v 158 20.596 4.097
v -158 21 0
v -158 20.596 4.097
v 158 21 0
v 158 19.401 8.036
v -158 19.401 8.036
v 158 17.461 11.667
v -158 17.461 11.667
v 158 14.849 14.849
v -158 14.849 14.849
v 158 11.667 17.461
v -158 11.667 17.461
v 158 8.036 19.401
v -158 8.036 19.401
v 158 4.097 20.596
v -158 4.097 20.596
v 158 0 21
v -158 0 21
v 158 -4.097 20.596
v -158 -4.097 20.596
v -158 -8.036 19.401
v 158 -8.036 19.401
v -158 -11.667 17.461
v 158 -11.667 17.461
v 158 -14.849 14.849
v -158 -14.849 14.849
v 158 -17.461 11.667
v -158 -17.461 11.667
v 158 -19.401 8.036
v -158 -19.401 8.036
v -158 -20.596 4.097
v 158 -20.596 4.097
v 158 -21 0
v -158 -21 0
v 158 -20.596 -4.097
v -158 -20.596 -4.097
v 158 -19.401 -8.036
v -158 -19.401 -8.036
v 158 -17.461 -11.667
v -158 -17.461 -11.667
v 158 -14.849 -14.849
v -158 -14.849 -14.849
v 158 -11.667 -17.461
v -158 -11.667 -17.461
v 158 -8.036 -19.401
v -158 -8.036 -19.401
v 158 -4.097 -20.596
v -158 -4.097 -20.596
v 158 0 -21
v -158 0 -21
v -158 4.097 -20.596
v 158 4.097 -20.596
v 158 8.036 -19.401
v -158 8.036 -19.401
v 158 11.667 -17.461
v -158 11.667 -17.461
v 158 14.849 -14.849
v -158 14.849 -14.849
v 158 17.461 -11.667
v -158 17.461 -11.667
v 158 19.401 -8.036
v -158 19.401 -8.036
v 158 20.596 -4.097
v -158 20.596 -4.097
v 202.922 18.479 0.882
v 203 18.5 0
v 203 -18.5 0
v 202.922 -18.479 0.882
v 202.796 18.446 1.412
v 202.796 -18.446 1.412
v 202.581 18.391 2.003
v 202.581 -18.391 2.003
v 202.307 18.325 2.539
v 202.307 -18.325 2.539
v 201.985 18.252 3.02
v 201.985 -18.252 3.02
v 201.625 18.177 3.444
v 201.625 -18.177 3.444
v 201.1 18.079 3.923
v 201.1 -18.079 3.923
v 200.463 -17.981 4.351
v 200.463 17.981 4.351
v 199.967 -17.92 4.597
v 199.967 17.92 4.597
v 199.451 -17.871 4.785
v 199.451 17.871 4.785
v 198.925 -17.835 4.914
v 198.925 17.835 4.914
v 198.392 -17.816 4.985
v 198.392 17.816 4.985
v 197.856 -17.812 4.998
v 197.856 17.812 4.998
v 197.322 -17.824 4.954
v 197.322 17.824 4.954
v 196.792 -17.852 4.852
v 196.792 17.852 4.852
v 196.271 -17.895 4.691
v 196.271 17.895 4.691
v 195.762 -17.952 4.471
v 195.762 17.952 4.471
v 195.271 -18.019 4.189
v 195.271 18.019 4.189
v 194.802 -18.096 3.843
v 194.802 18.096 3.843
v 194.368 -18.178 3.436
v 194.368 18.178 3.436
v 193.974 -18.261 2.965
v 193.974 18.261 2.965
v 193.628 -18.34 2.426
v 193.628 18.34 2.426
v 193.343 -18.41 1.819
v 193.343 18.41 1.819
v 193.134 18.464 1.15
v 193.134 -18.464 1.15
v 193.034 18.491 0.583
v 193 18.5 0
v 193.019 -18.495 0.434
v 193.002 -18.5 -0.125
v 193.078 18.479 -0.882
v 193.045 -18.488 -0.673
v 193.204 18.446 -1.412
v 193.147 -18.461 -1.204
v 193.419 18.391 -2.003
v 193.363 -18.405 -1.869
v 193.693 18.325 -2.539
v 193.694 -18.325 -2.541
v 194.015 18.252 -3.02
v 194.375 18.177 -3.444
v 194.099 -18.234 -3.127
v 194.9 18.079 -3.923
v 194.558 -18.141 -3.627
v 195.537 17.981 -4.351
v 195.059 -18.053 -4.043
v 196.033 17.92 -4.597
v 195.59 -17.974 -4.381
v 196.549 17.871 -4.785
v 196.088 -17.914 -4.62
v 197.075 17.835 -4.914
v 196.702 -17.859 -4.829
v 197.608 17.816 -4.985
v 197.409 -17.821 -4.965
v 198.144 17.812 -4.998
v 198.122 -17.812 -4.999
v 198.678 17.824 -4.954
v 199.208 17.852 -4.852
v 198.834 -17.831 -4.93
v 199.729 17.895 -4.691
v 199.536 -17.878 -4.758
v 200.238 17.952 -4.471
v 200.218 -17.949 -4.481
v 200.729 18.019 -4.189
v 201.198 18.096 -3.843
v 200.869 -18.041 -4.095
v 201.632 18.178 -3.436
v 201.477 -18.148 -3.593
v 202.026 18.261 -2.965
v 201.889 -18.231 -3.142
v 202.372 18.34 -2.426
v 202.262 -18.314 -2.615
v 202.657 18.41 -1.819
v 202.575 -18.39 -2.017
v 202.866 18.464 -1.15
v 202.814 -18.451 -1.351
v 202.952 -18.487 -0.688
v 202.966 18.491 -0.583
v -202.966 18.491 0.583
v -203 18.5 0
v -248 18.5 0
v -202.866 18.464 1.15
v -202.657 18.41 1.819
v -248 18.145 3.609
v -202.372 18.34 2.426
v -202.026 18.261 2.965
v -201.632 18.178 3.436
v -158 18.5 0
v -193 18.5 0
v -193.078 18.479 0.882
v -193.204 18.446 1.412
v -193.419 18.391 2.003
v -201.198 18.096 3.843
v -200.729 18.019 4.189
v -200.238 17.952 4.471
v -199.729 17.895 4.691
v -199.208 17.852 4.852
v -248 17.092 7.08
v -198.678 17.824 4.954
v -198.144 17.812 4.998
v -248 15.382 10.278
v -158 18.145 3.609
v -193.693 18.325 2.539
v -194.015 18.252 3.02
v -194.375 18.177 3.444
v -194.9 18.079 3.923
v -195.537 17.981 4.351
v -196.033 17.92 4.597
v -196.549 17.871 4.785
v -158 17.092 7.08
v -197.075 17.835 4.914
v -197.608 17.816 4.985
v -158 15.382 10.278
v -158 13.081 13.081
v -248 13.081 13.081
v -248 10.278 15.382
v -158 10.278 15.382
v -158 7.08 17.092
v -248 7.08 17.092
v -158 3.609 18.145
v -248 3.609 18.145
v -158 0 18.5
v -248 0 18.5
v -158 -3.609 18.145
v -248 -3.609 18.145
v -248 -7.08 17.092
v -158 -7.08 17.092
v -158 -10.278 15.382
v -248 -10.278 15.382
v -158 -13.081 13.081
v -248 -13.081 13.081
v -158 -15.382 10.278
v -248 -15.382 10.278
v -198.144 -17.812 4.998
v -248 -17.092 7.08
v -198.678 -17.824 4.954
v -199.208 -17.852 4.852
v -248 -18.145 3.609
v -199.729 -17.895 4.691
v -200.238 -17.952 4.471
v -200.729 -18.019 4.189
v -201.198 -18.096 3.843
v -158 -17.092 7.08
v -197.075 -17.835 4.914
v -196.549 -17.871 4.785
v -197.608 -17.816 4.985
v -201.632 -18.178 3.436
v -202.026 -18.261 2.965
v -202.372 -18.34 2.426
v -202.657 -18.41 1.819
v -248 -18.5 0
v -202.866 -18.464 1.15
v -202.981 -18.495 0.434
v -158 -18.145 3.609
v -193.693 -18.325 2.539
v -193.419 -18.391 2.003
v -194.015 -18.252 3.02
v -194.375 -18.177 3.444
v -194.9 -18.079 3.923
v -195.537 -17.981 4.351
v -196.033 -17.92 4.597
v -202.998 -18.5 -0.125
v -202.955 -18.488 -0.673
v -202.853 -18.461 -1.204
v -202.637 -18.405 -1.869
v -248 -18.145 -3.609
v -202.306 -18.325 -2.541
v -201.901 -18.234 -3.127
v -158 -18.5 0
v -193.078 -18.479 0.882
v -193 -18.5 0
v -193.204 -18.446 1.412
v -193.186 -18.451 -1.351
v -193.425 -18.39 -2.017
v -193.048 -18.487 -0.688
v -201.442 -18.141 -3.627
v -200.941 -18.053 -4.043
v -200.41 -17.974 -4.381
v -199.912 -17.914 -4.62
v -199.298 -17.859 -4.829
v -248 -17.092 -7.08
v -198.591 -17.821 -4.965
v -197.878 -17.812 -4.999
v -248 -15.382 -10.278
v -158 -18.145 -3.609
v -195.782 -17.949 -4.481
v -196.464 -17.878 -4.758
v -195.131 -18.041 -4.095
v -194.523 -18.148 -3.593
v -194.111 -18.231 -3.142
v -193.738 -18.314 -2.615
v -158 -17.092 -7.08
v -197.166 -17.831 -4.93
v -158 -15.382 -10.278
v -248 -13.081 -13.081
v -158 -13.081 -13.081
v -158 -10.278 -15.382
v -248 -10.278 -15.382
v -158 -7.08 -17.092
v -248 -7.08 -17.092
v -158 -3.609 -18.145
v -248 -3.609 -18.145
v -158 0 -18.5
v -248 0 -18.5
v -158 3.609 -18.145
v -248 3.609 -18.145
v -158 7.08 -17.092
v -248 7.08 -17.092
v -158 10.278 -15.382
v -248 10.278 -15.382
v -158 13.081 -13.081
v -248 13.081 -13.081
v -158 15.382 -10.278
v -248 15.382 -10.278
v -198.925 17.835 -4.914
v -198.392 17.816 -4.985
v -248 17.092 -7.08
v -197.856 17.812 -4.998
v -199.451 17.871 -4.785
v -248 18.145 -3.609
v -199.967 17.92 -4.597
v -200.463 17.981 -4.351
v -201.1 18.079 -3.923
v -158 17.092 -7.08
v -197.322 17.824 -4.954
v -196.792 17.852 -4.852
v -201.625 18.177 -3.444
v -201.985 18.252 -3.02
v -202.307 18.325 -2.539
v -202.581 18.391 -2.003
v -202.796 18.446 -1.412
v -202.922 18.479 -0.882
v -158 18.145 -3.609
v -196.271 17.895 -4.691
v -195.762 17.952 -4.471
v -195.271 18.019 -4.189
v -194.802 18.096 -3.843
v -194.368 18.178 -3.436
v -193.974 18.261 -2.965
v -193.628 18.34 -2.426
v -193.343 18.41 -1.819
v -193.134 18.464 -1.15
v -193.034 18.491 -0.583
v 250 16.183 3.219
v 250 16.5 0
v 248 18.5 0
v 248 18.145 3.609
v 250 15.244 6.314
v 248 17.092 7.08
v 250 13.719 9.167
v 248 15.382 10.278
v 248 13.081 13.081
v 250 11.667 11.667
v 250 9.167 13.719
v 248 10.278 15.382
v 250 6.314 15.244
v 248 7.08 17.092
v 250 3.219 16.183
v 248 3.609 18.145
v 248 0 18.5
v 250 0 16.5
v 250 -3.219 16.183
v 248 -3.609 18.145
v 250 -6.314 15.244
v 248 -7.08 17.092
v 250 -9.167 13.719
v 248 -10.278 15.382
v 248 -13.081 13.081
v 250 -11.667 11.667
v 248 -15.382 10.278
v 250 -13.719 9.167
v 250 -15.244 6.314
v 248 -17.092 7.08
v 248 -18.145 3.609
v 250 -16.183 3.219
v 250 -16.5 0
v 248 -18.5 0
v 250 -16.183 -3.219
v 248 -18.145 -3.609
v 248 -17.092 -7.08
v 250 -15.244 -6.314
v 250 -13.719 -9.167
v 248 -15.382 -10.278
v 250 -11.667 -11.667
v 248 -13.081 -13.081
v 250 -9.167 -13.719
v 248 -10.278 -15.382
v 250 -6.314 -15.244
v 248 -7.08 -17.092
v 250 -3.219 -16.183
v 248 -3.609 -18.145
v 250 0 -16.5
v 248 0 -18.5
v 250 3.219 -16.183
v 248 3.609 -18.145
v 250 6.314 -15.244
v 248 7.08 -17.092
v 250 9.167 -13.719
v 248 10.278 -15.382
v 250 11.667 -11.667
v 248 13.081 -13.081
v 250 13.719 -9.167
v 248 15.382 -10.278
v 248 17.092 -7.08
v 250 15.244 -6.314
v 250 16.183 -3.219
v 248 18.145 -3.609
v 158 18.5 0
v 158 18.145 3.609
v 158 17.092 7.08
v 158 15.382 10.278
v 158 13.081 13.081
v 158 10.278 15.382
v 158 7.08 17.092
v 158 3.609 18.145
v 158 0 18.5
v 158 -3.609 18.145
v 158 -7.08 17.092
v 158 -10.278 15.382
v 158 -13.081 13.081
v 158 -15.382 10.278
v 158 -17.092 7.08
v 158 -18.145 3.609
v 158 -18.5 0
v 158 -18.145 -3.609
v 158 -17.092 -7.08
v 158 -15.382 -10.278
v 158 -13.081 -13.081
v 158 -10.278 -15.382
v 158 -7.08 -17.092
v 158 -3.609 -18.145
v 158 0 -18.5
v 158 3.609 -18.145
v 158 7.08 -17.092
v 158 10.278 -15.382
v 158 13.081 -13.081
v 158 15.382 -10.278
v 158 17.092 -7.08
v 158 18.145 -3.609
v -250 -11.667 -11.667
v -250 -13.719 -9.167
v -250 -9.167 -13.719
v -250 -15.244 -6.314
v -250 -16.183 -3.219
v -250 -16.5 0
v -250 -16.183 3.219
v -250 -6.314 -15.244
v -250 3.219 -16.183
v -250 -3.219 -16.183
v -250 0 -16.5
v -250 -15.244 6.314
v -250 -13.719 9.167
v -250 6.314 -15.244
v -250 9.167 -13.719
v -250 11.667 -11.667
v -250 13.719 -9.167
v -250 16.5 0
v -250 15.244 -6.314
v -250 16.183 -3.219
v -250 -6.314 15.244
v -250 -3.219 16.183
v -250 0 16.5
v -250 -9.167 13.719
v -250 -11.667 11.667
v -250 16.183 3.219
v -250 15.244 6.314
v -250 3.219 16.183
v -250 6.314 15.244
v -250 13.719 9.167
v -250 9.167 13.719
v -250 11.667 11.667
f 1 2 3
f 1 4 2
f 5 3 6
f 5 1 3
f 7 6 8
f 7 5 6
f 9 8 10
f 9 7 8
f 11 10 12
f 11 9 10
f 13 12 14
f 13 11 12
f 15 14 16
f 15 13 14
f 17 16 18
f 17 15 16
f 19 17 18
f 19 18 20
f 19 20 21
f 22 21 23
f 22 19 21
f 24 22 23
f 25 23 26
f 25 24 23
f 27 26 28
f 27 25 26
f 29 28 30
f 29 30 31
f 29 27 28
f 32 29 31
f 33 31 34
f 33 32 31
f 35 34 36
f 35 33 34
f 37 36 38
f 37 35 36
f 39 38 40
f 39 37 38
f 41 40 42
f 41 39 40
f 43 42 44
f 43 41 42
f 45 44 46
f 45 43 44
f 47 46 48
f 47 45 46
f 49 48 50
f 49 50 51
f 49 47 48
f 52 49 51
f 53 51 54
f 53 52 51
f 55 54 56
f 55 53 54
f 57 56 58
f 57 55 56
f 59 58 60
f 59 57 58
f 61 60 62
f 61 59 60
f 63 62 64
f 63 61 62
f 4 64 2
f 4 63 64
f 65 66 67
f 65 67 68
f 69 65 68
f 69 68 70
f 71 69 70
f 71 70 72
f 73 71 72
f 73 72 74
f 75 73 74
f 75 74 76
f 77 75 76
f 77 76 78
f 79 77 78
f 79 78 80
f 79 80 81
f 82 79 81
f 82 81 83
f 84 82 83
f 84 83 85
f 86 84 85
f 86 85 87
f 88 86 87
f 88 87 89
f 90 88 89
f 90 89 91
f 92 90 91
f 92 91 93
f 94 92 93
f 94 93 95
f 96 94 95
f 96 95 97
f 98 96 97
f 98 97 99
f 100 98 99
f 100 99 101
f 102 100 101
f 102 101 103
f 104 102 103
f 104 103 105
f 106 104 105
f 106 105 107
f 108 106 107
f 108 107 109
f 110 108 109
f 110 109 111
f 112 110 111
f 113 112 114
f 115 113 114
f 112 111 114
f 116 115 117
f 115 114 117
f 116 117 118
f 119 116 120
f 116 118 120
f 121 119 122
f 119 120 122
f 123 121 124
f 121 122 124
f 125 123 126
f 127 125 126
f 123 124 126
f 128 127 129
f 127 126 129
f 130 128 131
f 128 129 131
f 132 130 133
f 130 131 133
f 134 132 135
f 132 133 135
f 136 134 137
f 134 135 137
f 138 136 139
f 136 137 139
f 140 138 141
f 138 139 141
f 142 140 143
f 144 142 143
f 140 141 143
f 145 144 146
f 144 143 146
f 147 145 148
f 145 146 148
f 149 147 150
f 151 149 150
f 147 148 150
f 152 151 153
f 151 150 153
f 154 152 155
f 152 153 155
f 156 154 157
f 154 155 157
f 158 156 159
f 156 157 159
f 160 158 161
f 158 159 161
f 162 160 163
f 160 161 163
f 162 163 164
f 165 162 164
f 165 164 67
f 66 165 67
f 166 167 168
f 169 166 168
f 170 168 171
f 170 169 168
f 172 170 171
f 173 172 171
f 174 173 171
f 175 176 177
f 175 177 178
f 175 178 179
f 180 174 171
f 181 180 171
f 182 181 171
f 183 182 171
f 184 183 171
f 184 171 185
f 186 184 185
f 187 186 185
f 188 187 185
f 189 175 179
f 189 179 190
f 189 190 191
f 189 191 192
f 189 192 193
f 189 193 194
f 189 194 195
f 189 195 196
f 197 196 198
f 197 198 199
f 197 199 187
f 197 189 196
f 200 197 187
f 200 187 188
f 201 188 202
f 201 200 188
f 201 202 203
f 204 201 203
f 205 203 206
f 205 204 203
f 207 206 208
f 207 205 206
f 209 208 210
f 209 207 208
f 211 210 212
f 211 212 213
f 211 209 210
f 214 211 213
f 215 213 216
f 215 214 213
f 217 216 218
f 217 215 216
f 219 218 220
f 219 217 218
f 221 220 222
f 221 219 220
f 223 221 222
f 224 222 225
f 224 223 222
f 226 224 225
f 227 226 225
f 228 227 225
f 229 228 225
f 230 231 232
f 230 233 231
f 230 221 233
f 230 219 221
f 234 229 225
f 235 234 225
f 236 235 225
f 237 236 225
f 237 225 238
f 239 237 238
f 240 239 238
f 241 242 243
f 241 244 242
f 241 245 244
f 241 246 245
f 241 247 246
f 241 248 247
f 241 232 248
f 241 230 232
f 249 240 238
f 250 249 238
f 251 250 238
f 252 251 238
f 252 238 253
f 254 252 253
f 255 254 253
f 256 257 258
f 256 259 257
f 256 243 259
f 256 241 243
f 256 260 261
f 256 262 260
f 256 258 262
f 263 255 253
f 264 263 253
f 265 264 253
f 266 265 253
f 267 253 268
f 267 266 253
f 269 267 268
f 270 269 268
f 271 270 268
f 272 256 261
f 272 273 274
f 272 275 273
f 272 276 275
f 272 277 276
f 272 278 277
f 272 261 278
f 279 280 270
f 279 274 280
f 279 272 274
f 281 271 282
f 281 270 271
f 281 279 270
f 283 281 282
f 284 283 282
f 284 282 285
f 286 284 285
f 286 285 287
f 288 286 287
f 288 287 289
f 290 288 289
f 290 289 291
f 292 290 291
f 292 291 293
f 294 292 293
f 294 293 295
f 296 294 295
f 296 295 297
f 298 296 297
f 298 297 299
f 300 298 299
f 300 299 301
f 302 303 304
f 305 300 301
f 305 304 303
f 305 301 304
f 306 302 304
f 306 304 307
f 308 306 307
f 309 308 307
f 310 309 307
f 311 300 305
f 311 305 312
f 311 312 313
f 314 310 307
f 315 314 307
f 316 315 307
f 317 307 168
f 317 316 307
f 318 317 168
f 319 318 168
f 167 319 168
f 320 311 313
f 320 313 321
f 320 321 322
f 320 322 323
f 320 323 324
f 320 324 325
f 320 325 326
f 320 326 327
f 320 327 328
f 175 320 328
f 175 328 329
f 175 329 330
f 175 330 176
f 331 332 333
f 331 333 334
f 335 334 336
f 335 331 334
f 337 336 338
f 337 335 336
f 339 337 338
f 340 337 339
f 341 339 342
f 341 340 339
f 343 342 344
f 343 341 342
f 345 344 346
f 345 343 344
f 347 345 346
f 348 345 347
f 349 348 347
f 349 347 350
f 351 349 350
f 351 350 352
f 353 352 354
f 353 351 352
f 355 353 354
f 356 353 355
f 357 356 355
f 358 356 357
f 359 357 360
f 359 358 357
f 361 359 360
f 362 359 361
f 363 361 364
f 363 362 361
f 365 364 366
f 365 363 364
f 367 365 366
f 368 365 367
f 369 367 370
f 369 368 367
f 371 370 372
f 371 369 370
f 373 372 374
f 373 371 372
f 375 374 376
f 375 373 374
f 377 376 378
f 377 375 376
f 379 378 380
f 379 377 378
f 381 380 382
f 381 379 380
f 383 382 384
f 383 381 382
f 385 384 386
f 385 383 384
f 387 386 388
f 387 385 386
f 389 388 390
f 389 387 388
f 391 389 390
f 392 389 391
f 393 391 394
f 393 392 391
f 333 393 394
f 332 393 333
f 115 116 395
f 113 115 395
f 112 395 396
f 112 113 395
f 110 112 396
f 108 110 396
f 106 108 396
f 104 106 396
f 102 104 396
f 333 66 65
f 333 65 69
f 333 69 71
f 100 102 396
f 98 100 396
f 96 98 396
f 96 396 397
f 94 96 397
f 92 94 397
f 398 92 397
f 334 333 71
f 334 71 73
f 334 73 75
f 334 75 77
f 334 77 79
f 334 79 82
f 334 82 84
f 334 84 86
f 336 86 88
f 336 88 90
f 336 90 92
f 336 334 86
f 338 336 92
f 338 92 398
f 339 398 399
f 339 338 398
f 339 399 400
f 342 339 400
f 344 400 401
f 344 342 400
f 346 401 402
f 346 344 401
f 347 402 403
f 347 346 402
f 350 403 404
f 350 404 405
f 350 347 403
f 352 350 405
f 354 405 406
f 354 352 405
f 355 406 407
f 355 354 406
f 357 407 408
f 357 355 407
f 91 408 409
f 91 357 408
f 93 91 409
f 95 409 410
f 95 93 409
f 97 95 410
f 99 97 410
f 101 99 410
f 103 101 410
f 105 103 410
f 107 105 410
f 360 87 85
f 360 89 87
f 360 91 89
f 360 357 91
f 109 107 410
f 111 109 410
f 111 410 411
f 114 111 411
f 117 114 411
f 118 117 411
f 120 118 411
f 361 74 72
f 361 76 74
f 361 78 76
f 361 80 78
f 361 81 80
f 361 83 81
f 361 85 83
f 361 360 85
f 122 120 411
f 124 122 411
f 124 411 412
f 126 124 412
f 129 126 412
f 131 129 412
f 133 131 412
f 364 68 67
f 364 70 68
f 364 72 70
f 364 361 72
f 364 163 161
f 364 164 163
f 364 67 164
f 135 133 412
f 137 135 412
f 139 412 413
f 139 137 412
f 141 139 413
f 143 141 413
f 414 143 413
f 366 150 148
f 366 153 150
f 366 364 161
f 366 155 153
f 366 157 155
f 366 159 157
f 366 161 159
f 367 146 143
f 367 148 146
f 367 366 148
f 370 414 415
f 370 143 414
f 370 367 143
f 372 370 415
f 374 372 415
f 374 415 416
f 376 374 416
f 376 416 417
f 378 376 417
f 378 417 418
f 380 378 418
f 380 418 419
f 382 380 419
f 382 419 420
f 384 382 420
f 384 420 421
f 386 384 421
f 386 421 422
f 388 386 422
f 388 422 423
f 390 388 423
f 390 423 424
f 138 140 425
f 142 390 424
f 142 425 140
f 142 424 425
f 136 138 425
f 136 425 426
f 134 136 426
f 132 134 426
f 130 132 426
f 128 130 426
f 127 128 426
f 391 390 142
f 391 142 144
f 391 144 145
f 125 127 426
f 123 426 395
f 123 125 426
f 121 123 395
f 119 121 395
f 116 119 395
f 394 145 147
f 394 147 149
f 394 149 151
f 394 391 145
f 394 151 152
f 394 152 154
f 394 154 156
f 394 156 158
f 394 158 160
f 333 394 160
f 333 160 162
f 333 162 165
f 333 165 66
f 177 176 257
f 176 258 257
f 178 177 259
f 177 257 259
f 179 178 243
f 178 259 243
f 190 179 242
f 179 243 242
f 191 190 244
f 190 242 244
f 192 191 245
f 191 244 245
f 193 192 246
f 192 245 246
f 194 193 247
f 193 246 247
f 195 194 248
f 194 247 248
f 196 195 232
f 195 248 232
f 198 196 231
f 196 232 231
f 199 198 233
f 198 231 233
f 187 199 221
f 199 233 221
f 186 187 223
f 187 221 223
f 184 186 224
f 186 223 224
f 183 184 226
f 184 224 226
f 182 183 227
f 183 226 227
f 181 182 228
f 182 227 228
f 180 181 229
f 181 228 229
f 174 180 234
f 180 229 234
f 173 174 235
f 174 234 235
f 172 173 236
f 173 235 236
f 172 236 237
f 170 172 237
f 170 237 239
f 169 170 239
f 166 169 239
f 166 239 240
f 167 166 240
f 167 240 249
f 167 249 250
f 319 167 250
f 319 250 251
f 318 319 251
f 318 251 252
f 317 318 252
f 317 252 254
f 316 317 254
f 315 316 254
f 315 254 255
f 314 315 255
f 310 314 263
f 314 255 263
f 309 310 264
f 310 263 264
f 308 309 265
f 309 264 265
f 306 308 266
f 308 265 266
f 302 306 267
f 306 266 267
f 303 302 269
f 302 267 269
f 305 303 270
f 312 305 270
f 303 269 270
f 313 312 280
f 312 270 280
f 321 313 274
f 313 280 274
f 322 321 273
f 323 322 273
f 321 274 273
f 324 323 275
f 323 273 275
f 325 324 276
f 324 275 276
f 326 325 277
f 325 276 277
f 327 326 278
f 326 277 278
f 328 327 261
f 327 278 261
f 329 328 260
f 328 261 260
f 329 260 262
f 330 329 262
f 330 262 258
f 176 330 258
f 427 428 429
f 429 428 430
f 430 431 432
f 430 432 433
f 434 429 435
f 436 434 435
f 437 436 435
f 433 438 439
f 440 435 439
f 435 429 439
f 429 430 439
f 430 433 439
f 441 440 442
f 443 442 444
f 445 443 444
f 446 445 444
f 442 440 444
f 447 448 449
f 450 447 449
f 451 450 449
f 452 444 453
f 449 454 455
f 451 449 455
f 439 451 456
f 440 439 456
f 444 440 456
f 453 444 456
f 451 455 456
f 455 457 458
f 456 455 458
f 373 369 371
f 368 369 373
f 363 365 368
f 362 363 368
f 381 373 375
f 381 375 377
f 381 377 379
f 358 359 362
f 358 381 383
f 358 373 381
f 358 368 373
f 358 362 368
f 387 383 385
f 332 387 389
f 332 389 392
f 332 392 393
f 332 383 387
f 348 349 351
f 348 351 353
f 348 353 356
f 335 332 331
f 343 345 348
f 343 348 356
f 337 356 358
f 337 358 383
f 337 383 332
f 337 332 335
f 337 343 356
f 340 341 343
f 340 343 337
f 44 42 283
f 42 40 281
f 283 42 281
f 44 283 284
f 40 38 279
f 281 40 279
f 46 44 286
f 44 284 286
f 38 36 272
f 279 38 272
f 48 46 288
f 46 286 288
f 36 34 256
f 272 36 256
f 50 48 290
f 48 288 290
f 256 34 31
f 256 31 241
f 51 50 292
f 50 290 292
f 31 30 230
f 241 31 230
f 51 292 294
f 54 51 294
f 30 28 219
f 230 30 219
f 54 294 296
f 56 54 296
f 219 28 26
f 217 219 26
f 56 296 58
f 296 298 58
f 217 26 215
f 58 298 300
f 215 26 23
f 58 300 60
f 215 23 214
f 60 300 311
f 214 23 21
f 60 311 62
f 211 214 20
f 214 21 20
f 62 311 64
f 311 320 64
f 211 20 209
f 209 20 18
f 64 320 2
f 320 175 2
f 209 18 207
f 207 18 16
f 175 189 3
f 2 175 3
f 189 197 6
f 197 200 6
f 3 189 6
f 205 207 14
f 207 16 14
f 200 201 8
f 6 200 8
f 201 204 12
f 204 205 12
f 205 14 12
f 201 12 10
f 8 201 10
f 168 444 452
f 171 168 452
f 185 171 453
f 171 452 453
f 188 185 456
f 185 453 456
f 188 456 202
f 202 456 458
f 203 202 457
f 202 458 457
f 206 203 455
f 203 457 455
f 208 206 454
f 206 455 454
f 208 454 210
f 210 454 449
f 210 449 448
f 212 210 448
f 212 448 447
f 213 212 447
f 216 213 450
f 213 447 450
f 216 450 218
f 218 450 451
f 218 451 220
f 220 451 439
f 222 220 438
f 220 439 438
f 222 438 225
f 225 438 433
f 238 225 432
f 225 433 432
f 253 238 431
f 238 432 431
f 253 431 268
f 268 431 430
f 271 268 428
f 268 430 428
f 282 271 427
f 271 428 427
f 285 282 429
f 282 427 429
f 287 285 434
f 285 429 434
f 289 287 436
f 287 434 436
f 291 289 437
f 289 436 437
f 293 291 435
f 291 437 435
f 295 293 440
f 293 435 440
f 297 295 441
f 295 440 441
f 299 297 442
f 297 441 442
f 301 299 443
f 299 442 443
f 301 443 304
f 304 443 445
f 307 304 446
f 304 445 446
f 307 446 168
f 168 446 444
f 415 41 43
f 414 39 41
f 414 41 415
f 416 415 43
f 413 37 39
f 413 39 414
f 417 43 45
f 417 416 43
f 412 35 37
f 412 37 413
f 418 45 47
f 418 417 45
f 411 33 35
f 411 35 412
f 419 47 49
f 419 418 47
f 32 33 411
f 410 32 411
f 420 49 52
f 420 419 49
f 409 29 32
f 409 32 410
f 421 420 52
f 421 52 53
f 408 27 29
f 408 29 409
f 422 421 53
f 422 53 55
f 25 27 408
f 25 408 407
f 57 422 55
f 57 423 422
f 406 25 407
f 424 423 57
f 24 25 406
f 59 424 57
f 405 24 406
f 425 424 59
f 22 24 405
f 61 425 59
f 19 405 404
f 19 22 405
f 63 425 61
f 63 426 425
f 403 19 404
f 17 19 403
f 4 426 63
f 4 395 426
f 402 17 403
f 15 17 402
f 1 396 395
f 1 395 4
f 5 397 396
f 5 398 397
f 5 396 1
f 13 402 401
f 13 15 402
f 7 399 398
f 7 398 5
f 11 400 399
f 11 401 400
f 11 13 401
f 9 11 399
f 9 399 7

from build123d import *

# Parameters (mm, degrees)
F0_R     = 18.5
F1_DEPTH = 250
F0_R_2   = 21
F2_DEPTH = 158
F3_SIZE  = 2
F5_R     = 5
F6_DEPTH = 50


with BuildPart() as f1:
    # F0 (on Right) → F1 (new body, symmetric)
    with BuildSketch(Plane.YZ):
        Circle(F0_R)
    extrude(amount=F1_DEPTH, both=True)

    # F0 (on Right) → F2 (join, symmetric)
    with BuildSketch(Plane.YZ):
        Circle(F0_R_2)
        Circle(F0_R, mode=Mode.SUBTRACT)
    extrude(amount=F2_DEPTH, both=True)

    # F3
    f3_edges = [f1.edges().sort_by_distance(p)[0] for p in [
        (250, -18.5, 0),
        (-250, -18.5, 0),
    ]]
    chamfer(f3_edges, length=F3_SIZE)

    # F5 (on face) → F6 (cut, symmetric)
    with BuildSketch(Plane.XZ):
        with Locations((-198, 0)):
            Circle(F5_R)
        with Locations((198, 0)):
            Circle(F5_R)
    extrude(amount=F6_DEPTH, both=True, mode=Mode.SUBTRACT)


solid = f1.part
